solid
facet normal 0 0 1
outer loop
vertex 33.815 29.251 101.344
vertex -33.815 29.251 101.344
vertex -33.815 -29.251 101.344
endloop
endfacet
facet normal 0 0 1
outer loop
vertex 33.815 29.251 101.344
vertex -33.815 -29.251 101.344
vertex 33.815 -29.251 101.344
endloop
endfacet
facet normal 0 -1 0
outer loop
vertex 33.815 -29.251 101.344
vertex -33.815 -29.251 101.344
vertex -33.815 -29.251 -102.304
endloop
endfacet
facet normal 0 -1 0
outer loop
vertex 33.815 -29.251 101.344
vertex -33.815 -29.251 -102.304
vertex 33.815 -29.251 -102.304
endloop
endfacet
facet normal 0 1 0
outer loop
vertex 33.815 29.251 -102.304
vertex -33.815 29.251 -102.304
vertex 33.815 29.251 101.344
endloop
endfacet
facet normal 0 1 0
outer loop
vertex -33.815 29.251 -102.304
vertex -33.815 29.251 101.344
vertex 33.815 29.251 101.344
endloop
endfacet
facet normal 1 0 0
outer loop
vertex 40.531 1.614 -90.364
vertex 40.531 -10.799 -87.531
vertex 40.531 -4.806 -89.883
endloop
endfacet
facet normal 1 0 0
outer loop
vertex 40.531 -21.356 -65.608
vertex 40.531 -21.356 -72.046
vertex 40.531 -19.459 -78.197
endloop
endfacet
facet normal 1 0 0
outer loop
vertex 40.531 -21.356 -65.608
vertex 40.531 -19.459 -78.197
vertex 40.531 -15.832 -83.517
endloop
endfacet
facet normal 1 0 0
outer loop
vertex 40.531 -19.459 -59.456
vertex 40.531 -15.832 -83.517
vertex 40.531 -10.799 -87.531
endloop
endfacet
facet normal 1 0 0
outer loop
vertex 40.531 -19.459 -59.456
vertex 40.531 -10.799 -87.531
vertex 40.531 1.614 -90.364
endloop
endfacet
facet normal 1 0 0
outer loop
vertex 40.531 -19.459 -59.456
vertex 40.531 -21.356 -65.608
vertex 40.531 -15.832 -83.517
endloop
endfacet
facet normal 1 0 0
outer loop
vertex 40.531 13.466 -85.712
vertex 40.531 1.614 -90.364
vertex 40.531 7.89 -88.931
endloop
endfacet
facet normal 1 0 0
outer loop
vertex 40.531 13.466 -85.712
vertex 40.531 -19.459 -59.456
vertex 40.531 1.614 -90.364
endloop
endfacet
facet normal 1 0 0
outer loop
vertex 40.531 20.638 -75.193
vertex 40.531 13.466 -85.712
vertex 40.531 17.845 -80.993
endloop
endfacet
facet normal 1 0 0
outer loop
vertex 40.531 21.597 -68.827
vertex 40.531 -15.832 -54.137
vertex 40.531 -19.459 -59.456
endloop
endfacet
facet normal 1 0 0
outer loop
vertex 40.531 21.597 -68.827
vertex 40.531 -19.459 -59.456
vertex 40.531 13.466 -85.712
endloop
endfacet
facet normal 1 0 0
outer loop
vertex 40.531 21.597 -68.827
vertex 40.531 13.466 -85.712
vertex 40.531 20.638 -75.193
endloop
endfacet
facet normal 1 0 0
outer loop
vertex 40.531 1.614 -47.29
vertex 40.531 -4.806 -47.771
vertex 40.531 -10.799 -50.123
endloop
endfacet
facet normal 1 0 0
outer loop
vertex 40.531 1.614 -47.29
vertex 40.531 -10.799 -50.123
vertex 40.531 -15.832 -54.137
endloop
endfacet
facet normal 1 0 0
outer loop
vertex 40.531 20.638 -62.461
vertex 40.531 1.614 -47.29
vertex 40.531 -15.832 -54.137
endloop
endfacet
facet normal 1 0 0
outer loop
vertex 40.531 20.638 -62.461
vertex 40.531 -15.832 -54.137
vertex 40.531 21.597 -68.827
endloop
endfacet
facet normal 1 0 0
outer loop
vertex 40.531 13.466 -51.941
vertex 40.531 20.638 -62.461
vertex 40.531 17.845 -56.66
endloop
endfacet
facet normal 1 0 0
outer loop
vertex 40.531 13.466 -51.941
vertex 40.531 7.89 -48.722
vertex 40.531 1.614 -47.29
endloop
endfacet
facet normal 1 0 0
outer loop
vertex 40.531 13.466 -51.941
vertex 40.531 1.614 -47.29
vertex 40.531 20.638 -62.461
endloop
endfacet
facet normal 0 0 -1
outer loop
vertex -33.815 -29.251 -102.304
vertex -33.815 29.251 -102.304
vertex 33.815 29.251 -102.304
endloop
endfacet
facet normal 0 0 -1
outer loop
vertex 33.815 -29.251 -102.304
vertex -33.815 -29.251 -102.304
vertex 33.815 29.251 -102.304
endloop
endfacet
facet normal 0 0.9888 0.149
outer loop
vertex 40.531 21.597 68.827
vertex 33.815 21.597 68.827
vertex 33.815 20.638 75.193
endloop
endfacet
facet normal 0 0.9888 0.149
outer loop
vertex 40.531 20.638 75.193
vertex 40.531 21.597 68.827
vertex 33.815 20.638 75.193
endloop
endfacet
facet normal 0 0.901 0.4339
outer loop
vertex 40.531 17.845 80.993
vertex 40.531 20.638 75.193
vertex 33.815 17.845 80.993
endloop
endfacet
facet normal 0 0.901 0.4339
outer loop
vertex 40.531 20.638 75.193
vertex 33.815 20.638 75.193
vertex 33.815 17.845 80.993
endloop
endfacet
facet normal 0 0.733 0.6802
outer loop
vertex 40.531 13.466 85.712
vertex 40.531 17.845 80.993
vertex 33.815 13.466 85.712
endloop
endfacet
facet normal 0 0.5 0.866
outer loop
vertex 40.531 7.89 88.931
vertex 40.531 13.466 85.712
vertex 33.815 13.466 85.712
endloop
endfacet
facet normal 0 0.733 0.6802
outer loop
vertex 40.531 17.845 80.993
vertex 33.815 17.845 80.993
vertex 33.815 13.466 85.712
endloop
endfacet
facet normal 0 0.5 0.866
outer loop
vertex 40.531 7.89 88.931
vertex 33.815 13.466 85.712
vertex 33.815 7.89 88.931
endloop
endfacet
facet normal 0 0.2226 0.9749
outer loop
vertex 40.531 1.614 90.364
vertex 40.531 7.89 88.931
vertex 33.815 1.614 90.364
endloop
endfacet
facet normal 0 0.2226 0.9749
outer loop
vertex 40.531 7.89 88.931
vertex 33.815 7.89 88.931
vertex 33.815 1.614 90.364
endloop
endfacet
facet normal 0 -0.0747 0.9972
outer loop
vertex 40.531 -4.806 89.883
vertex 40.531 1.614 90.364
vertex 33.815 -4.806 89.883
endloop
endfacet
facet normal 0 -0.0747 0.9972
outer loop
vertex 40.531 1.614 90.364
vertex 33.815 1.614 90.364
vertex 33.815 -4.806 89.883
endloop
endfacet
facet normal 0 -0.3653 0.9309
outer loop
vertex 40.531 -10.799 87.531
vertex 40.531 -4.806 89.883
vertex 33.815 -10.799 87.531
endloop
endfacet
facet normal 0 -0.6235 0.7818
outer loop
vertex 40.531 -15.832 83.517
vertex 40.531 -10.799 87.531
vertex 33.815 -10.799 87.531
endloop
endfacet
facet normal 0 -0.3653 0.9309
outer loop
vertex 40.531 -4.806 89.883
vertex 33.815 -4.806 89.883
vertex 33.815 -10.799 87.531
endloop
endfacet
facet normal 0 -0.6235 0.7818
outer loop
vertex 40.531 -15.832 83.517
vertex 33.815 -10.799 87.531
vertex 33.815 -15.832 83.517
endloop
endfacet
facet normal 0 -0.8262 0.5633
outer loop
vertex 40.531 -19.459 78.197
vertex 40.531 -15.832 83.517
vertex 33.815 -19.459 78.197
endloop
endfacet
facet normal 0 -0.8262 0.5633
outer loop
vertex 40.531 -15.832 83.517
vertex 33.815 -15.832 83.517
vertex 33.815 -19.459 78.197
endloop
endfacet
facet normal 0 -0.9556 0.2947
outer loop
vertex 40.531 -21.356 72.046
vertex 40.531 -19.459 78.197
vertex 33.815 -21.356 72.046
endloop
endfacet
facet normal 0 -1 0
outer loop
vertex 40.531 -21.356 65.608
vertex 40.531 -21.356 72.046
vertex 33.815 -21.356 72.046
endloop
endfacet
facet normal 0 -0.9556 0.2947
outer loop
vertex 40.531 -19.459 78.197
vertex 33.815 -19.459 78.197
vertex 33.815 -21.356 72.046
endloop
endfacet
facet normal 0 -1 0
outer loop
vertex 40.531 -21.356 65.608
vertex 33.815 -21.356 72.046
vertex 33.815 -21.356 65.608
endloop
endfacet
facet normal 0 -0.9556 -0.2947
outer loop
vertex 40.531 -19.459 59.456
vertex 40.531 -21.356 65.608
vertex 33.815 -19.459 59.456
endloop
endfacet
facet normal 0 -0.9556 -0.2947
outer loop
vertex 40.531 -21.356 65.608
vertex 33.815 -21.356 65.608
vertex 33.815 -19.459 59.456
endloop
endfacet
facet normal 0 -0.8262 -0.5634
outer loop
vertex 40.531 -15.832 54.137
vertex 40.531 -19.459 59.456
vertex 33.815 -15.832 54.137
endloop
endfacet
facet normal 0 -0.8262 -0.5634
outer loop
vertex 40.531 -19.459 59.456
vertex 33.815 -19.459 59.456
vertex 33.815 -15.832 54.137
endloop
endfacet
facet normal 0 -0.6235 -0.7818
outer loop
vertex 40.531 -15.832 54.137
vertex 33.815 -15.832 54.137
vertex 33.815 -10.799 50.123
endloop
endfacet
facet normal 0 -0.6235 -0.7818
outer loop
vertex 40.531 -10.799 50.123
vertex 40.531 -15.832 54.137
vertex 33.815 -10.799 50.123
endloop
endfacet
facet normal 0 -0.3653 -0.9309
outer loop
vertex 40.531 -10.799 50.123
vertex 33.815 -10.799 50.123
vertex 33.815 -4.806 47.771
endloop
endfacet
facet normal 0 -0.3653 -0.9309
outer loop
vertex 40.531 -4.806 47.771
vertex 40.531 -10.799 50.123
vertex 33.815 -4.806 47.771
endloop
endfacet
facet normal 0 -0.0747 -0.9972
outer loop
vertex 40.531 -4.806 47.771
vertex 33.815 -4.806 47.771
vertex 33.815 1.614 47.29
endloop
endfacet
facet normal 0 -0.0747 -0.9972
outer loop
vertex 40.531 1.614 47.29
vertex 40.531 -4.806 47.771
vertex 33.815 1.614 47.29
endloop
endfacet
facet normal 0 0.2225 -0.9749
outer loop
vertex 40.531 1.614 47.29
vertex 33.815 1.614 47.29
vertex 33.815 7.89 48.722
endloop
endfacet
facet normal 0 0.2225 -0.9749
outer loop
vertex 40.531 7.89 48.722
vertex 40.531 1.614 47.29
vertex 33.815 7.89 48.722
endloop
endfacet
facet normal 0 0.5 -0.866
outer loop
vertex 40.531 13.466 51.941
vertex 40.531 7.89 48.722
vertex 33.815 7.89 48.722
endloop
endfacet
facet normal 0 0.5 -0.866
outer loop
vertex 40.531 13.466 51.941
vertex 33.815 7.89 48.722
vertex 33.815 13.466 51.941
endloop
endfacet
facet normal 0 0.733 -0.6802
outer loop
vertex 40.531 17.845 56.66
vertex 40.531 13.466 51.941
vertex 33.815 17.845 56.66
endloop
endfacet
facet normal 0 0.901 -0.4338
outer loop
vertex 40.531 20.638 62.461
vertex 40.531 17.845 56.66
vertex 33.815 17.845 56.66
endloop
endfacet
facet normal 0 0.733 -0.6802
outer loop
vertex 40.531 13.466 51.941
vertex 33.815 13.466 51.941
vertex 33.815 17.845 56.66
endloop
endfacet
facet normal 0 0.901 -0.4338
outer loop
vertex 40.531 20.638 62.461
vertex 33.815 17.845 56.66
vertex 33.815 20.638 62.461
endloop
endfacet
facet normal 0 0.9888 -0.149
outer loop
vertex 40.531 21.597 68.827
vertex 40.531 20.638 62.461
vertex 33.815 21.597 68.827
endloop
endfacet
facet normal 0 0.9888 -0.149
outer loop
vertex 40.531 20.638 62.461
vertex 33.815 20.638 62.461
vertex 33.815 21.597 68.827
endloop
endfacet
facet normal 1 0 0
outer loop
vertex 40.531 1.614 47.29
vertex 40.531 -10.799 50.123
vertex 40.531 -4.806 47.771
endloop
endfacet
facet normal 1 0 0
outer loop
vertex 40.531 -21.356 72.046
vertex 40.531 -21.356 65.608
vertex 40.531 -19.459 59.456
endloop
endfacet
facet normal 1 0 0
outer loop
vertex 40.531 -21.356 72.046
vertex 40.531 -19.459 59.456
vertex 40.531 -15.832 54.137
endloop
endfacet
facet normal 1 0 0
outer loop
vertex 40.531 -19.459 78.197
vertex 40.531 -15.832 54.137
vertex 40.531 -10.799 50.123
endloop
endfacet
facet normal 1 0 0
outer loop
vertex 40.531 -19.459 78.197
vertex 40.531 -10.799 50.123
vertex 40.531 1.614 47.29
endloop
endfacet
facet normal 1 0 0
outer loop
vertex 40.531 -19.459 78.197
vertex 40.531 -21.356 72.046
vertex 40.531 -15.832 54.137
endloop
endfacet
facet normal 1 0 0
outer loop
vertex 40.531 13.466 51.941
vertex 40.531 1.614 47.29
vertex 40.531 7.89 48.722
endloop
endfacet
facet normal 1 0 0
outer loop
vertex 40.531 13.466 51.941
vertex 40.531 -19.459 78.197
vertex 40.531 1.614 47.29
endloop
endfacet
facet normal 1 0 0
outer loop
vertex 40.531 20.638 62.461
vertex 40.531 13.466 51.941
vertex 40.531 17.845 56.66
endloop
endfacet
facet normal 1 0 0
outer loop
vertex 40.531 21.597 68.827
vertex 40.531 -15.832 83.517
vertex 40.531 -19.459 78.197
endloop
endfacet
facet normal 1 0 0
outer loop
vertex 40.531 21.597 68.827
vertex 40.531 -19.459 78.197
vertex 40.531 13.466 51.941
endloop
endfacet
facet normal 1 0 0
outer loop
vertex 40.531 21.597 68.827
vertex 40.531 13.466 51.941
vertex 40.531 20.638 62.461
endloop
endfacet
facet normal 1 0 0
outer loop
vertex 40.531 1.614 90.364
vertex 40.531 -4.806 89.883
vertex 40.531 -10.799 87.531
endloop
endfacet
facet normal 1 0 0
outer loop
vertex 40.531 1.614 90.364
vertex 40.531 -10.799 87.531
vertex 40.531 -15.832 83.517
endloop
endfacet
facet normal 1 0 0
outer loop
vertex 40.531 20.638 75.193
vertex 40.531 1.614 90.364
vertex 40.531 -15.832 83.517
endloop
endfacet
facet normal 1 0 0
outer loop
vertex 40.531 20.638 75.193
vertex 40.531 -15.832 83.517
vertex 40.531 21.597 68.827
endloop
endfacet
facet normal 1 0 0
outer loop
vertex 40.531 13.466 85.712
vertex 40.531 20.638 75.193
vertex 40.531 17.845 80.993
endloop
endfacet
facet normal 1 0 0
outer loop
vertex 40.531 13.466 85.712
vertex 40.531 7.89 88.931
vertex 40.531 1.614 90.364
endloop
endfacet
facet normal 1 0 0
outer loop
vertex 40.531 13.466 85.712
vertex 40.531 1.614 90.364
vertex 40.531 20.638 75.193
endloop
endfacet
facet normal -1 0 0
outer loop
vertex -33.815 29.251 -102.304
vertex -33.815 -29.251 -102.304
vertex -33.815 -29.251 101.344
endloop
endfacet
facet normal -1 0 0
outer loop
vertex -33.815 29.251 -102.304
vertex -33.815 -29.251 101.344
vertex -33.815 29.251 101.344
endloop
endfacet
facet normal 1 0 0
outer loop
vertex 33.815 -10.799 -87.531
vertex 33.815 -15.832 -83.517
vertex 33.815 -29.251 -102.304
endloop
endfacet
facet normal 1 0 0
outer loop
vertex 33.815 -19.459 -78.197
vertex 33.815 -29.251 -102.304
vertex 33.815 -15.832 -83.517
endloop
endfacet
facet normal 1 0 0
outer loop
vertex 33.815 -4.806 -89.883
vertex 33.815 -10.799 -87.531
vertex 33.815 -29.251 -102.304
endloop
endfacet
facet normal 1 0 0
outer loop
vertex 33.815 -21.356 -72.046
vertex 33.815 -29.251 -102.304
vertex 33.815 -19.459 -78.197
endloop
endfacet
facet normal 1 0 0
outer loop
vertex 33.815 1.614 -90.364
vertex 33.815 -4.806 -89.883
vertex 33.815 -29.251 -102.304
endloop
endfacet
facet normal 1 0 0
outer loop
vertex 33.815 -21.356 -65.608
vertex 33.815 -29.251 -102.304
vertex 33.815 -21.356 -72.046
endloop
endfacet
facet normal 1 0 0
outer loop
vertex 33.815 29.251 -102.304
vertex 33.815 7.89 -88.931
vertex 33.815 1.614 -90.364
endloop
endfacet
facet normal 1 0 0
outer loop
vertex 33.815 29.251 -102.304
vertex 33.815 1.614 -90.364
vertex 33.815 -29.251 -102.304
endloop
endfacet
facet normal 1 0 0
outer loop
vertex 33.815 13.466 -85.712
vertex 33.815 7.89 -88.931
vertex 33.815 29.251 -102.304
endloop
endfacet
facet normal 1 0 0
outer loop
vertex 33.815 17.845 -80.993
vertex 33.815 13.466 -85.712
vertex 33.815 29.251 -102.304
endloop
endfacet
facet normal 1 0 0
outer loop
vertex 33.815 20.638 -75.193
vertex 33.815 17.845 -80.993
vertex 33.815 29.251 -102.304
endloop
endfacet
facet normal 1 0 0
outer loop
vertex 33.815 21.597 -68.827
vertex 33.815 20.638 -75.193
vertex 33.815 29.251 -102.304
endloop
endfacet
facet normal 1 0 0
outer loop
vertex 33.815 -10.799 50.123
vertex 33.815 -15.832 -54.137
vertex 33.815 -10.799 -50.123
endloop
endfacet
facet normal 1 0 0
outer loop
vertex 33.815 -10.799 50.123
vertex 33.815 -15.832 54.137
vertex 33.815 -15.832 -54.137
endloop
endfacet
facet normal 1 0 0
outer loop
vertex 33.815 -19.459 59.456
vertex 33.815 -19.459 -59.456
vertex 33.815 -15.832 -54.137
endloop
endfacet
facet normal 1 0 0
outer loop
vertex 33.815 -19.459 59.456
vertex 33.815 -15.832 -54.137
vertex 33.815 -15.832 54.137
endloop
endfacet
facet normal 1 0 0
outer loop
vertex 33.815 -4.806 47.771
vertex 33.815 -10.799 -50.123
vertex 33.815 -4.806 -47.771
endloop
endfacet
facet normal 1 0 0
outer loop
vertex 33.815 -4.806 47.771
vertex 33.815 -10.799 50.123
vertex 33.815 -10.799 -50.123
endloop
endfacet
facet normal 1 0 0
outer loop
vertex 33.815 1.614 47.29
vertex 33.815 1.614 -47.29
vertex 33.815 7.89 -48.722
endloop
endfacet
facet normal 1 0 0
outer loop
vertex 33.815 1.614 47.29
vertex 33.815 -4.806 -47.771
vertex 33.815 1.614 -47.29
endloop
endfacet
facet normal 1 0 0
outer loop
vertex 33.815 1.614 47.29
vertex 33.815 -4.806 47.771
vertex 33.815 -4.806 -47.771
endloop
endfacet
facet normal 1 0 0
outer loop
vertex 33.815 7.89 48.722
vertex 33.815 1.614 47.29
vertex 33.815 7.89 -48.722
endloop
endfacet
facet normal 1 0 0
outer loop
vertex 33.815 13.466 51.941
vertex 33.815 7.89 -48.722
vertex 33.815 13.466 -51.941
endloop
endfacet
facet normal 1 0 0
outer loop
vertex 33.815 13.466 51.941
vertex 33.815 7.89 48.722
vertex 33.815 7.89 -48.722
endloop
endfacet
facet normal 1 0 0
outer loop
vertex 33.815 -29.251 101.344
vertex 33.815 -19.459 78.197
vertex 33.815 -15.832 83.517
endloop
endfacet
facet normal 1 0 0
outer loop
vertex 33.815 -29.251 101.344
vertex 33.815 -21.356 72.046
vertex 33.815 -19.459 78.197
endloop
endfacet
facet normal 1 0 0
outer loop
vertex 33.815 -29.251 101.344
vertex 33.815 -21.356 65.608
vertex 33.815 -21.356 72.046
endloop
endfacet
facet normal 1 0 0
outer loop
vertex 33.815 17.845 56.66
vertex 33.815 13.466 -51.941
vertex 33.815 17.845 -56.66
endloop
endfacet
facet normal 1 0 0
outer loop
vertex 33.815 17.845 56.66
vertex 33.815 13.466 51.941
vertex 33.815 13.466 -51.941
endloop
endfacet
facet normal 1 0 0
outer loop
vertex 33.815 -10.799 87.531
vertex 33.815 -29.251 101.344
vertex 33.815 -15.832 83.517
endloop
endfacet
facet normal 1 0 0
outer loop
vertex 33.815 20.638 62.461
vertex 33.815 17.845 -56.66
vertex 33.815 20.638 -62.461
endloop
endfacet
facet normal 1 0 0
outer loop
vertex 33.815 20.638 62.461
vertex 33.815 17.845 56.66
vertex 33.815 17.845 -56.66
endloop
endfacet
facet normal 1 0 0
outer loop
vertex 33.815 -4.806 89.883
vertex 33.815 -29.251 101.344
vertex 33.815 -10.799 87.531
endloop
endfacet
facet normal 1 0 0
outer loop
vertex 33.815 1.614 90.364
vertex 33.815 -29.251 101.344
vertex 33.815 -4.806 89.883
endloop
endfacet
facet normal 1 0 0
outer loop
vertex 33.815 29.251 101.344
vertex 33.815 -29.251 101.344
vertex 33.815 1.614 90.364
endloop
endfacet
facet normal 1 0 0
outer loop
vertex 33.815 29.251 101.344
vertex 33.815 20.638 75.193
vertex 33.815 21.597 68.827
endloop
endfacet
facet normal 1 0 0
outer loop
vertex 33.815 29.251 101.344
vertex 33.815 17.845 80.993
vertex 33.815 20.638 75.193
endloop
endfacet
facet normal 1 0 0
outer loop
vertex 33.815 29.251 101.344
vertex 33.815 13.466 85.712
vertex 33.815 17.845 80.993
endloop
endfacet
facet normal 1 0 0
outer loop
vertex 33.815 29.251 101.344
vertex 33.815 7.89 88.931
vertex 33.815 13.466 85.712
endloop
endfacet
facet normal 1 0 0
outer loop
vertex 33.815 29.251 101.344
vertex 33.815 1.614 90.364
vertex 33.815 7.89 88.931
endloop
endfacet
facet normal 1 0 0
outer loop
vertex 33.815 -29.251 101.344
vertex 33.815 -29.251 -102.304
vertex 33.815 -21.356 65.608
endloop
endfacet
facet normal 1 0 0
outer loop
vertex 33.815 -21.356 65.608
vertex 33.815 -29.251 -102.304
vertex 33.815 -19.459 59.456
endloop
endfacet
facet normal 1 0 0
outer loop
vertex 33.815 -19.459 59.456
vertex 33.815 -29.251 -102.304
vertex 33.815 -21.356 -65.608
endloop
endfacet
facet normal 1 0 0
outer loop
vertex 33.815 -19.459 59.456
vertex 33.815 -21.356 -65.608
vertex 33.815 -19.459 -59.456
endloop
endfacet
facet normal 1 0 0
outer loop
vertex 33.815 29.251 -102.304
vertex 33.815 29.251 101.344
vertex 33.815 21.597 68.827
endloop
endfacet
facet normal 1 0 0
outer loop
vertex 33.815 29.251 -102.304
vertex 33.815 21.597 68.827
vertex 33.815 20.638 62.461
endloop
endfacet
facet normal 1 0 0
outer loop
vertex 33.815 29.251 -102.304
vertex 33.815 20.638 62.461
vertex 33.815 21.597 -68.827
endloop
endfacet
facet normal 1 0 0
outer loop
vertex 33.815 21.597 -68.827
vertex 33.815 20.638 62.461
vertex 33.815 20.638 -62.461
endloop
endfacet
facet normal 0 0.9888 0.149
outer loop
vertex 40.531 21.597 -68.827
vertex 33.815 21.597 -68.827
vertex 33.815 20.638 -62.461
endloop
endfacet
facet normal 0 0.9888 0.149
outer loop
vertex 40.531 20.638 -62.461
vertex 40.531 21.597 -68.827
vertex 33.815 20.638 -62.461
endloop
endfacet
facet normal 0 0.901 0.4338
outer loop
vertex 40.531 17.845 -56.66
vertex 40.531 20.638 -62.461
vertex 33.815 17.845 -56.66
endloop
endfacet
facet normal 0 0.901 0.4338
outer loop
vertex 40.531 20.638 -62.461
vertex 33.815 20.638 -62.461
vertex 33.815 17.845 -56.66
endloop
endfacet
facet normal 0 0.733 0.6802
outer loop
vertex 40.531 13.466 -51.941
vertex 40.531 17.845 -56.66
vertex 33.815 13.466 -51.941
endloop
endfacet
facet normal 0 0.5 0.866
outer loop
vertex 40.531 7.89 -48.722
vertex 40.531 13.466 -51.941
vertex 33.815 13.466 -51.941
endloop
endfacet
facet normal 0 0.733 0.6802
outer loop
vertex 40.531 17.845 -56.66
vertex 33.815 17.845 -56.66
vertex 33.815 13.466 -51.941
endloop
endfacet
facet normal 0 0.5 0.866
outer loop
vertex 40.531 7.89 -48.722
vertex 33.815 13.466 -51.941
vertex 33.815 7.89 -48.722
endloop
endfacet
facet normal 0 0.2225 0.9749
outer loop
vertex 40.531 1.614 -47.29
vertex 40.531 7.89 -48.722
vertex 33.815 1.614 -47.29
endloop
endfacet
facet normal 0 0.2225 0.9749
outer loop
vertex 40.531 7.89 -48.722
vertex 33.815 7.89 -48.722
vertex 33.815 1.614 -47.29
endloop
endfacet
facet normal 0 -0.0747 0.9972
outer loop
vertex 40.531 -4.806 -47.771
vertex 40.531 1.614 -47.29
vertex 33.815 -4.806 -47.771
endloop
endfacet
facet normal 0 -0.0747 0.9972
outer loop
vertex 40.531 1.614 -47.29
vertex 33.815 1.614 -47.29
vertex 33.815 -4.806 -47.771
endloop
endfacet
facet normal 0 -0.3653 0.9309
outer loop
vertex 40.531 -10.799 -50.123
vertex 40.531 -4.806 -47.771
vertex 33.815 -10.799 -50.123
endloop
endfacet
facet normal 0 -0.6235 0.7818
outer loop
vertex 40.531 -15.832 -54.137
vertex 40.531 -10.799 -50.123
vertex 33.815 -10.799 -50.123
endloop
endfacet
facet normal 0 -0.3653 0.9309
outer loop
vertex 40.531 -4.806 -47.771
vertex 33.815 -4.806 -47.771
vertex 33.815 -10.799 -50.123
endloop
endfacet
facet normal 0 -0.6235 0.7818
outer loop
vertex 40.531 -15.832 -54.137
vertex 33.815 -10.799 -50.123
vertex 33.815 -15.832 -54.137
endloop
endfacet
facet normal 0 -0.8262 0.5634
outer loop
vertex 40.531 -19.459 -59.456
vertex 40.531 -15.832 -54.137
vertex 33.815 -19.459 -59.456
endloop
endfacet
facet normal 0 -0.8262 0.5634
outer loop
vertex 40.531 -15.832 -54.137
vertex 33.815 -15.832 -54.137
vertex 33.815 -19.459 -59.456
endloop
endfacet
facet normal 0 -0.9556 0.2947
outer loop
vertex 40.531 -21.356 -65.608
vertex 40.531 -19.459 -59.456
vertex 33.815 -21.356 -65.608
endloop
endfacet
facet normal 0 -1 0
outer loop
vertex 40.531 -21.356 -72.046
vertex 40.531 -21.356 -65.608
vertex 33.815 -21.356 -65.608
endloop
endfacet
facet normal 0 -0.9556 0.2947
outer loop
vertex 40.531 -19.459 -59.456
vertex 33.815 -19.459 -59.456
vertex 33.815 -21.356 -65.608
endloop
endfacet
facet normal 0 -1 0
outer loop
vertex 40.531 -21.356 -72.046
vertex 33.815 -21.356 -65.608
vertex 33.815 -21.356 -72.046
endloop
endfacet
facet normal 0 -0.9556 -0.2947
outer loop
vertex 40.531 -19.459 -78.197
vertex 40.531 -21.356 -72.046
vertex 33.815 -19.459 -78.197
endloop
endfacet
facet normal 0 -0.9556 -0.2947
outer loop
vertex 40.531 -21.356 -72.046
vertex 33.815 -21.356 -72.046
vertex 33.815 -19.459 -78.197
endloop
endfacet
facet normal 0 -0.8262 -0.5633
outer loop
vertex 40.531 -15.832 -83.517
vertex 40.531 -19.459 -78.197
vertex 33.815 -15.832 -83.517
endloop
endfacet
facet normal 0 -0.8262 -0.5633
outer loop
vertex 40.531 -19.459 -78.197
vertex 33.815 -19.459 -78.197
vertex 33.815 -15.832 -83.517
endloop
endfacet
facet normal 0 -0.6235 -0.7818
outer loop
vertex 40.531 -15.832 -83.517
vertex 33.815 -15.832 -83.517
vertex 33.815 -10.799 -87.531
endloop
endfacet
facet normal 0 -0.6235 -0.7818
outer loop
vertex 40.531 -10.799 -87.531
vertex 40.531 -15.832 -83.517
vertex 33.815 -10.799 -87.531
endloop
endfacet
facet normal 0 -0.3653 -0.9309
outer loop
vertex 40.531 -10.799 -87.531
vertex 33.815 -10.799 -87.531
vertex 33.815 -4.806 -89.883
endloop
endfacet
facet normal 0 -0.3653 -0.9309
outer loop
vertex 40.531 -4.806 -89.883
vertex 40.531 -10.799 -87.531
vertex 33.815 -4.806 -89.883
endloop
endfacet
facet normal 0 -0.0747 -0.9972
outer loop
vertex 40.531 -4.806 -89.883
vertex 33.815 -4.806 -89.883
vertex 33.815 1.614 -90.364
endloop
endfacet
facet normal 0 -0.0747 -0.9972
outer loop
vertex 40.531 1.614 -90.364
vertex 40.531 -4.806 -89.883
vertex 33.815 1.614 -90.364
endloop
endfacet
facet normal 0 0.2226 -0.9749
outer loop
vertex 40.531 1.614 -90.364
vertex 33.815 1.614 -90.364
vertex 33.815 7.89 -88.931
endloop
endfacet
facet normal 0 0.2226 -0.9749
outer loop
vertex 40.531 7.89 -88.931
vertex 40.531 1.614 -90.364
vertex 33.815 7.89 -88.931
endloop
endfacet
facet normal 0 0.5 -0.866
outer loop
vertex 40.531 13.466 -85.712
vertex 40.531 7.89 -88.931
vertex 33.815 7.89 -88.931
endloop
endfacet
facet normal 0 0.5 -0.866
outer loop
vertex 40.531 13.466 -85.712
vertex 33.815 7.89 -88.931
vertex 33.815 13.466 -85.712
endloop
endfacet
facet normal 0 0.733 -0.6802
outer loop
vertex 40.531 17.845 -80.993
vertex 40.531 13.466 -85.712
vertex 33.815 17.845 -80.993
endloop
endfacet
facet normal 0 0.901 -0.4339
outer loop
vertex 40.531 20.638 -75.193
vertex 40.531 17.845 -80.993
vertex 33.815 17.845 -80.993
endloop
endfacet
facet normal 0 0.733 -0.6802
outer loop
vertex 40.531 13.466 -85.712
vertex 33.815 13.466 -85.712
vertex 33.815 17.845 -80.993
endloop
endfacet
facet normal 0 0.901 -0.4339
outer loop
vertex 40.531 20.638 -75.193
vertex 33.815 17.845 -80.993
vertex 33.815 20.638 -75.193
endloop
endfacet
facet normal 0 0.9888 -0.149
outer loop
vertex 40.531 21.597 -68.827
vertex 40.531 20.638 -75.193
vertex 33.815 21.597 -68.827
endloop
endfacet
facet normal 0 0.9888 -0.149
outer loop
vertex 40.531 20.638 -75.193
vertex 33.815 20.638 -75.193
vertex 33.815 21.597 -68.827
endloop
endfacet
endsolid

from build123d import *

# Parameters (mm, degrees)
F0_W          = 67.630976
F0_H          = 58.502942
F1_DEPTH      = 101.344071
F1_DEPTH_BACK = 102.304079
F2_R          = 21.597403
F3_DEPTH      = 6.715551


with BuildPart() as f1:
    # F0 (on Top) → F1 (new body, two sides)
    with BuildSketch(Plane.XY) as f1_sk:
        Rectangle(F0_W, F0_H)
    extrude(amount=F1_DEPTH)
    extrude(f1_sk.sketch, amount=-F1_DEPTH_BACK)

    # F2 (on face) → F3 (join)
    with BuildSketch(Plane.YZ.offset(33.815488)):
        with Locations((0, 68.826675)):
            Circle(F2_R)
        with Locations((0, -68.826675)):
            Circle(F2_R)
    extrude(amount=F3_DEPTH)


solid = f1.part
